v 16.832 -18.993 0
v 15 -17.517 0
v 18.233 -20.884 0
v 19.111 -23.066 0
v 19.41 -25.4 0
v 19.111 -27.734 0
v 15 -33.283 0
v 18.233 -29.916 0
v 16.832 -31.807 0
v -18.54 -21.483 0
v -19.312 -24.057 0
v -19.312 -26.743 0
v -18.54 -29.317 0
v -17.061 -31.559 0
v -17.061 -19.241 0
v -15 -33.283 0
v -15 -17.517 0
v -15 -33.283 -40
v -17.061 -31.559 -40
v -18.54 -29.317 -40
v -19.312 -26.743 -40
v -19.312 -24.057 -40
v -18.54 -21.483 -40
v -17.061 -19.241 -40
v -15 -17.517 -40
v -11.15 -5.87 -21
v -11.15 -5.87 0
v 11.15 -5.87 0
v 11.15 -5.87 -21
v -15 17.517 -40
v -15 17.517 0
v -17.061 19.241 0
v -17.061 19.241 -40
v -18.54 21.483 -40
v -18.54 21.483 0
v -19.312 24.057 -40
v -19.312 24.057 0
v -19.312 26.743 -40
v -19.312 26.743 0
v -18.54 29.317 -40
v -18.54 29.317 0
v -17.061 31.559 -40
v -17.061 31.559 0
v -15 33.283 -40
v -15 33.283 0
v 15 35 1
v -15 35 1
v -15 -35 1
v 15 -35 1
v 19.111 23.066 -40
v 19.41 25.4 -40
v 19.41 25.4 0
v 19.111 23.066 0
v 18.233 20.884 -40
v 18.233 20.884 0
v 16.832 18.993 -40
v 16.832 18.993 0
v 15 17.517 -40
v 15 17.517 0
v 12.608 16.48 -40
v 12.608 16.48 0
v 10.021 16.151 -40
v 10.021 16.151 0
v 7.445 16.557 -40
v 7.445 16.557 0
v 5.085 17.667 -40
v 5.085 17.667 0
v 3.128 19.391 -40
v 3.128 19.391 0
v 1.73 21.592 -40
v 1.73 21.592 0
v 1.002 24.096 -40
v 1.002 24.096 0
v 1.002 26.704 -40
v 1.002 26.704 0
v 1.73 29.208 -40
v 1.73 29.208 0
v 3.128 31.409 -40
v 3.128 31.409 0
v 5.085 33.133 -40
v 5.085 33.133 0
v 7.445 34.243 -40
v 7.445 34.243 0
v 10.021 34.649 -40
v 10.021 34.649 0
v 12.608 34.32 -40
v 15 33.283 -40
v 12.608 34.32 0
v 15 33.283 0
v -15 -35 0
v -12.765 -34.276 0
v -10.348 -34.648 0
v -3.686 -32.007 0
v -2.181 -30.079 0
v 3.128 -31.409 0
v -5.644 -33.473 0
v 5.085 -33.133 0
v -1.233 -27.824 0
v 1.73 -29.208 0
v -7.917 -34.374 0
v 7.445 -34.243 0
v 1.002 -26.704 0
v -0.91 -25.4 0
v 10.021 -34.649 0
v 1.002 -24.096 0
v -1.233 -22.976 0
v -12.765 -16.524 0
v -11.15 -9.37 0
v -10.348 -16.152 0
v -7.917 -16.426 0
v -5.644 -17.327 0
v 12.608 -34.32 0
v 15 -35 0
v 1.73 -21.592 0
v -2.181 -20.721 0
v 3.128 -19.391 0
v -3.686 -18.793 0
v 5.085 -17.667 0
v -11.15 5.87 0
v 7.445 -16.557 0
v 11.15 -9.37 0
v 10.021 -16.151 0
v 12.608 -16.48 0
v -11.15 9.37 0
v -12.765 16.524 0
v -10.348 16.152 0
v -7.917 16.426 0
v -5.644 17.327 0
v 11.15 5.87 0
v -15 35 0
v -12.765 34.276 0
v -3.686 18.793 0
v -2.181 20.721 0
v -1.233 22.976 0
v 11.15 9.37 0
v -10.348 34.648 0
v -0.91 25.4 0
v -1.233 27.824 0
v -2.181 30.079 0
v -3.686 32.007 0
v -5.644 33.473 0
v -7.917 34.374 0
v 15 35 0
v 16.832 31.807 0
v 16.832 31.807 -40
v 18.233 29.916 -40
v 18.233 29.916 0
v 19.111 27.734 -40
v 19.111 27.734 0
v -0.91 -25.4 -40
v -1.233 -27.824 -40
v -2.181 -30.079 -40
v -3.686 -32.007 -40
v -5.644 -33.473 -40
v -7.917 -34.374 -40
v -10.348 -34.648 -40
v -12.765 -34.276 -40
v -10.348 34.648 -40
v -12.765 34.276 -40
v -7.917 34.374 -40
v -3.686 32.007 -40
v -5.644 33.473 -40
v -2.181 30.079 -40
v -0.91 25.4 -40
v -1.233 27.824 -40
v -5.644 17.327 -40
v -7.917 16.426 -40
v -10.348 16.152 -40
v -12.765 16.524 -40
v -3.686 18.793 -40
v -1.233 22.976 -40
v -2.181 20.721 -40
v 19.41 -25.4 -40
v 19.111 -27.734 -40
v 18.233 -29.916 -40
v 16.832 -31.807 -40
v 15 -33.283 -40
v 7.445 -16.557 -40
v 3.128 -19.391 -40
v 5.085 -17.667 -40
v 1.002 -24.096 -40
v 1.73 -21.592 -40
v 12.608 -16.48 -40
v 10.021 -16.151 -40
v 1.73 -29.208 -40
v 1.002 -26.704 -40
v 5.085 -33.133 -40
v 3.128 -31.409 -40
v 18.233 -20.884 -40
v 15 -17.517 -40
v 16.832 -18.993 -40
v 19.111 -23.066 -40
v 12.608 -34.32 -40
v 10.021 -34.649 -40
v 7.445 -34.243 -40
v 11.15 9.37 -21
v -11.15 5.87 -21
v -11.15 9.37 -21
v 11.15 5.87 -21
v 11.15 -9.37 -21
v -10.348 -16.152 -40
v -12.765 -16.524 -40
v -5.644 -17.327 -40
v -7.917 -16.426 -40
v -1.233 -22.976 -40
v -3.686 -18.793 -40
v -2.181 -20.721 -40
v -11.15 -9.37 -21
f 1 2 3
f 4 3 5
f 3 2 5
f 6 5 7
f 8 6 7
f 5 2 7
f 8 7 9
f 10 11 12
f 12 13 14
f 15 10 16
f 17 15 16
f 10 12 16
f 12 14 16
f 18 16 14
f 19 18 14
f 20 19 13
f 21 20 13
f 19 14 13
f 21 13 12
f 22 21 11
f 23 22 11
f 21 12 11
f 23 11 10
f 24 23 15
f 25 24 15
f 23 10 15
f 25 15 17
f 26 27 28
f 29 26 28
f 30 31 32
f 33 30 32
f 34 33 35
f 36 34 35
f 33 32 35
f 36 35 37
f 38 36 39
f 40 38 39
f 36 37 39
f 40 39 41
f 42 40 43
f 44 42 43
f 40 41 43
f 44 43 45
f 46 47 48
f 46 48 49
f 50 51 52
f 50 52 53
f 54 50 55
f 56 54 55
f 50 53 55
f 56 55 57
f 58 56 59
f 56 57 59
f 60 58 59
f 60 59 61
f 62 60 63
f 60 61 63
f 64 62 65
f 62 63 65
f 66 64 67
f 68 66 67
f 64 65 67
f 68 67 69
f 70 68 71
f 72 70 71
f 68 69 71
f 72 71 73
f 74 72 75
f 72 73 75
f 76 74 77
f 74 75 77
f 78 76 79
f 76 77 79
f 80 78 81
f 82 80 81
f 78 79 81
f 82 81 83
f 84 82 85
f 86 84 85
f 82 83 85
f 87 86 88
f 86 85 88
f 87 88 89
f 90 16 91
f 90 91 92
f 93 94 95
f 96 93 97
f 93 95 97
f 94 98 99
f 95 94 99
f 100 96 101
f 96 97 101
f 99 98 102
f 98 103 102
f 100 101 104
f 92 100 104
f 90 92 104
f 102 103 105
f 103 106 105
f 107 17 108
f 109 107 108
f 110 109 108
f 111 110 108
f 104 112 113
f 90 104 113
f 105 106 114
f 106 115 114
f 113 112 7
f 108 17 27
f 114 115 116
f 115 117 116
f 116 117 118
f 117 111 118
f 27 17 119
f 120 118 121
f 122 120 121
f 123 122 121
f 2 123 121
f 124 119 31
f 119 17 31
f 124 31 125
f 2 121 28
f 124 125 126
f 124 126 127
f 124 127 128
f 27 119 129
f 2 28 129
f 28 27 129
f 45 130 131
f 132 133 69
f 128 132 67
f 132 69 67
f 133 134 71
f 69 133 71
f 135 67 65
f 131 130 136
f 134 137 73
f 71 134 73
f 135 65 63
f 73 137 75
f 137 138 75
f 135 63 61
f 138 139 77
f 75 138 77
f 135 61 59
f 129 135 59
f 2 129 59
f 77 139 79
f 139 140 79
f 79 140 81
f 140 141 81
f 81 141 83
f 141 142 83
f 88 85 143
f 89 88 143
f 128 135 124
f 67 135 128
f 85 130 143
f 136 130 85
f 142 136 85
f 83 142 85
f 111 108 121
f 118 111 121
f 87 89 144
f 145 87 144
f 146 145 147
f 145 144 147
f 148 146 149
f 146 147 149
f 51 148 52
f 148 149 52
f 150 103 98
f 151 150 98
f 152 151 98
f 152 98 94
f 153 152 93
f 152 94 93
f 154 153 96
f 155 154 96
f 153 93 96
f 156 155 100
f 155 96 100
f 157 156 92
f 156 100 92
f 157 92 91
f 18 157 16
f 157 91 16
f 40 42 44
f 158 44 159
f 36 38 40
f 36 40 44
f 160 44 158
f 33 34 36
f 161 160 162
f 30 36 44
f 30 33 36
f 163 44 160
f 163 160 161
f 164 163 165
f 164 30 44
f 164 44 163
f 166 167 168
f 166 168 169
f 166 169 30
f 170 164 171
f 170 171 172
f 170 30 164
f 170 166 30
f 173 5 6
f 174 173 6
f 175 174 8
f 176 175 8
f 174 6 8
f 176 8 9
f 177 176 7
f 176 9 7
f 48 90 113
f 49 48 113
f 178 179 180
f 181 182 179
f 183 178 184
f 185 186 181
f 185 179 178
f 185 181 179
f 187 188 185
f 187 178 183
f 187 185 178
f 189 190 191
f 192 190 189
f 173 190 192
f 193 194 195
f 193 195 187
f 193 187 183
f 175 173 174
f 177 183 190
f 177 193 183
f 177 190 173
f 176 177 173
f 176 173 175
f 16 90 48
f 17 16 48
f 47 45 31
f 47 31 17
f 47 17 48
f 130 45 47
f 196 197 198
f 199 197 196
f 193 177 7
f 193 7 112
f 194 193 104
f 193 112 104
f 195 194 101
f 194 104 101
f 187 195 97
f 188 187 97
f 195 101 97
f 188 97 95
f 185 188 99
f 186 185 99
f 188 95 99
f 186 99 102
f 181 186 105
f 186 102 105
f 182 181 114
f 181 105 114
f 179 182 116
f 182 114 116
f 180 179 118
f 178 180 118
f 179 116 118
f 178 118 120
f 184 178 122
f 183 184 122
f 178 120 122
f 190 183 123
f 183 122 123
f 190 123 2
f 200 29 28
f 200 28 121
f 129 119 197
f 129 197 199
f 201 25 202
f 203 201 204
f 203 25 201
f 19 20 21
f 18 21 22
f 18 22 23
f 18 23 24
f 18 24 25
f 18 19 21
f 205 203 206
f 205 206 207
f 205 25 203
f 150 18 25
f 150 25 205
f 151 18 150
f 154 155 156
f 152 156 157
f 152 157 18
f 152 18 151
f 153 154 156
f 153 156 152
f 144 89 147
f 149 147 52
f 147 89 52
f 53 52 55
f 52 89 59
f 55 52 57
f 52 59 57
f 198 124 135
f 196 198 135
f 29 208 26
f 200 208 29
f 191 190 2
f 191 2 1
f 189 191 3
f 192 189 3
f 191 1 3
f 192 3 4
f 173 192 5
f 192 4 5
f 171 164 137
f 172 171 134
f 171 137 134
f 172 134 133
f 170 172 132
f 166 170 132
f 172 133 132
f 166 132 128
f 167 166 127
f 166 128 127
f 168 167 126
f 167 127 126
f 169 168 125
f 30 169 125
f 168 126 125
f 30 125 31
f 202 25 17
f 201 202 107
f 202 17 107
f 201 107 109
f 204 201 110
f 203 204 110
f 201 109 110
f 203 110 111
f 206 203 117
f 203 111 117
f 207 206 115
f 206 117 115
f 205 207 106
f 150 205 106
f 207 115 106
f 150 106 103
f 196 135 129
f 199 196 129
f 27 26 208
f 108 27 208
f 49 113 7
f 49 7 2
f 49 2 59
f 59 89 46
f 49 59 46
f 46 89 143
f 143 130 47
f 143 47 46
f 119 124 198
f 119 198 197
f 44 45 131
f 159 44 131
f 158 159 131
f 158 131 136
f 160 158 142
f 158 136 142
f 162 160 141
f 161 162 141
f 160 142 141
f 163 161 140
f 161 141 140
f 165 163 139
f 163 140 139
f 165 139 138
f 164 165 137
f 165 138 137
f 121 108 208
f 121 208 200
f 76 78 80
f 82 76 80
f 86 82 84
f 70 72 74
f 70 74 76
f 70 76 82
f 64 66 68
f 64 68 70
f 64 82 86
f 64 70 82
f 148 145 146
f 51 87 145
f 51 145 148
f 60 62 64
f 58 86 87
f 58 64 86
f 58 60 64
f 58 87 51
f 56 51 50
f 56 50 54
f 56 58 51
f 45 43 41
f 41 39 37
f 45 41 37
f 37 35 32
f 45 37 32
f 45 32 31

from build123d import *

# Parameters (mm, degrees)
F0_W     = 30
F0_H     = 70
F1_DEPTH = 1
F3_W     = 22.3
F3_H     = 3.5
F4_DEPTH = 21
F5_DEPTH = 40


with BuildPart() as f1:
    # F0 (on Top) → F1 (new body)
    with BuildSketch(Plane.XY):
        Rectangle(F0_W, F0_H)
    extrude(amount=F1_DEPTH)

    # F3 (on face) → F4 (join)
    with BuildSketch(Plane(origin=(0, 0, 0), x_dir=(1, 0, 0), z_dir=(0, 0, -1))):
        with Locations((0, 7.62)):
            Rectangle(F3_W, F3_H)
        with Locations((0, -7.62)):
            Rectangle(F3_W, F3_H)
    extrude(amount=F4_DEPTH)

    # F3 (on face) → F5 (join)
    with BuildSketch(Plane(origin=(0, 0, 0), x_dir=(1, 0, 0), z_dir=(0, 0, -1))):
        with BuildLine():
            Line((-15, 17.517304), (-15, 33.282696))
            ThreePointArc((-15, 33.282696), (-19.41, 25.4), (-15, 17.517304))
        make_face()
        with BuildLine():
            Line((15, 17.517304), (15, 33.282696))
            ThreePointArc((15, 33.282696), (0.91, 25.4), (15, 17.517304))
        make_face()
        with BuildLine():
            ThreePointArc((-0.91, -25.4), (-5.643779, -17.327438), (-15, -17.517304))
            Line((-15, -17.517304), (-15, -33.282696))
            ThreePointArc((-15, -33.282696), (-5.643779, -33.472562), (-0.91, -25.4))
        make_face()
        with BuildLine():
            ThreePointArc((19.41, -25.4), (18.232562, -20.883779), (15, -17.517304))
            Line((15, -17.517304), (15, -33.282696))
            ThreePointArc((15, -33.282696), (18.232562, -29.916221), (19.41, -25.4))
        make_face()
        with BuildLine():
            Line((-15, -33.282696), (-15, -17.517304))
            ThreePointArc((-15, -17.517304), (-19.41, -25.4), (-15, -33.282696))
        make_face()
        with BuildLine():
            ThreePointArc((-0.91, 25.4), (-5.643779, 33.472562), (-15, 33.282696))
            Line((-15, 33.282696), (-15, 17.517304))
            ThreePointArc((-15, 17.517304), (-5.643779, 17.327438), (-0.91, 25.4))
        make_face()
        with BuildLine():
            ThreePointArc((15, 17.517304), (18.232562, 20.883779), (19.41, 25.4))
            ThreePointArc((19.41, 25.4), (18.232562, 29.916221), (15, 33.282696))
            Line((15, 33.282696), (15, 17.517304))
        make_face()
        with BuildLine():
            Line((15, -33.282696), (15, -17.517304))
            ThreePointArc((15, -17.517304), (0.91, -25.4), (15, -33.282696))
        make_face()
    extrude(amount=F5_DEPTH)


solid = f1.part
